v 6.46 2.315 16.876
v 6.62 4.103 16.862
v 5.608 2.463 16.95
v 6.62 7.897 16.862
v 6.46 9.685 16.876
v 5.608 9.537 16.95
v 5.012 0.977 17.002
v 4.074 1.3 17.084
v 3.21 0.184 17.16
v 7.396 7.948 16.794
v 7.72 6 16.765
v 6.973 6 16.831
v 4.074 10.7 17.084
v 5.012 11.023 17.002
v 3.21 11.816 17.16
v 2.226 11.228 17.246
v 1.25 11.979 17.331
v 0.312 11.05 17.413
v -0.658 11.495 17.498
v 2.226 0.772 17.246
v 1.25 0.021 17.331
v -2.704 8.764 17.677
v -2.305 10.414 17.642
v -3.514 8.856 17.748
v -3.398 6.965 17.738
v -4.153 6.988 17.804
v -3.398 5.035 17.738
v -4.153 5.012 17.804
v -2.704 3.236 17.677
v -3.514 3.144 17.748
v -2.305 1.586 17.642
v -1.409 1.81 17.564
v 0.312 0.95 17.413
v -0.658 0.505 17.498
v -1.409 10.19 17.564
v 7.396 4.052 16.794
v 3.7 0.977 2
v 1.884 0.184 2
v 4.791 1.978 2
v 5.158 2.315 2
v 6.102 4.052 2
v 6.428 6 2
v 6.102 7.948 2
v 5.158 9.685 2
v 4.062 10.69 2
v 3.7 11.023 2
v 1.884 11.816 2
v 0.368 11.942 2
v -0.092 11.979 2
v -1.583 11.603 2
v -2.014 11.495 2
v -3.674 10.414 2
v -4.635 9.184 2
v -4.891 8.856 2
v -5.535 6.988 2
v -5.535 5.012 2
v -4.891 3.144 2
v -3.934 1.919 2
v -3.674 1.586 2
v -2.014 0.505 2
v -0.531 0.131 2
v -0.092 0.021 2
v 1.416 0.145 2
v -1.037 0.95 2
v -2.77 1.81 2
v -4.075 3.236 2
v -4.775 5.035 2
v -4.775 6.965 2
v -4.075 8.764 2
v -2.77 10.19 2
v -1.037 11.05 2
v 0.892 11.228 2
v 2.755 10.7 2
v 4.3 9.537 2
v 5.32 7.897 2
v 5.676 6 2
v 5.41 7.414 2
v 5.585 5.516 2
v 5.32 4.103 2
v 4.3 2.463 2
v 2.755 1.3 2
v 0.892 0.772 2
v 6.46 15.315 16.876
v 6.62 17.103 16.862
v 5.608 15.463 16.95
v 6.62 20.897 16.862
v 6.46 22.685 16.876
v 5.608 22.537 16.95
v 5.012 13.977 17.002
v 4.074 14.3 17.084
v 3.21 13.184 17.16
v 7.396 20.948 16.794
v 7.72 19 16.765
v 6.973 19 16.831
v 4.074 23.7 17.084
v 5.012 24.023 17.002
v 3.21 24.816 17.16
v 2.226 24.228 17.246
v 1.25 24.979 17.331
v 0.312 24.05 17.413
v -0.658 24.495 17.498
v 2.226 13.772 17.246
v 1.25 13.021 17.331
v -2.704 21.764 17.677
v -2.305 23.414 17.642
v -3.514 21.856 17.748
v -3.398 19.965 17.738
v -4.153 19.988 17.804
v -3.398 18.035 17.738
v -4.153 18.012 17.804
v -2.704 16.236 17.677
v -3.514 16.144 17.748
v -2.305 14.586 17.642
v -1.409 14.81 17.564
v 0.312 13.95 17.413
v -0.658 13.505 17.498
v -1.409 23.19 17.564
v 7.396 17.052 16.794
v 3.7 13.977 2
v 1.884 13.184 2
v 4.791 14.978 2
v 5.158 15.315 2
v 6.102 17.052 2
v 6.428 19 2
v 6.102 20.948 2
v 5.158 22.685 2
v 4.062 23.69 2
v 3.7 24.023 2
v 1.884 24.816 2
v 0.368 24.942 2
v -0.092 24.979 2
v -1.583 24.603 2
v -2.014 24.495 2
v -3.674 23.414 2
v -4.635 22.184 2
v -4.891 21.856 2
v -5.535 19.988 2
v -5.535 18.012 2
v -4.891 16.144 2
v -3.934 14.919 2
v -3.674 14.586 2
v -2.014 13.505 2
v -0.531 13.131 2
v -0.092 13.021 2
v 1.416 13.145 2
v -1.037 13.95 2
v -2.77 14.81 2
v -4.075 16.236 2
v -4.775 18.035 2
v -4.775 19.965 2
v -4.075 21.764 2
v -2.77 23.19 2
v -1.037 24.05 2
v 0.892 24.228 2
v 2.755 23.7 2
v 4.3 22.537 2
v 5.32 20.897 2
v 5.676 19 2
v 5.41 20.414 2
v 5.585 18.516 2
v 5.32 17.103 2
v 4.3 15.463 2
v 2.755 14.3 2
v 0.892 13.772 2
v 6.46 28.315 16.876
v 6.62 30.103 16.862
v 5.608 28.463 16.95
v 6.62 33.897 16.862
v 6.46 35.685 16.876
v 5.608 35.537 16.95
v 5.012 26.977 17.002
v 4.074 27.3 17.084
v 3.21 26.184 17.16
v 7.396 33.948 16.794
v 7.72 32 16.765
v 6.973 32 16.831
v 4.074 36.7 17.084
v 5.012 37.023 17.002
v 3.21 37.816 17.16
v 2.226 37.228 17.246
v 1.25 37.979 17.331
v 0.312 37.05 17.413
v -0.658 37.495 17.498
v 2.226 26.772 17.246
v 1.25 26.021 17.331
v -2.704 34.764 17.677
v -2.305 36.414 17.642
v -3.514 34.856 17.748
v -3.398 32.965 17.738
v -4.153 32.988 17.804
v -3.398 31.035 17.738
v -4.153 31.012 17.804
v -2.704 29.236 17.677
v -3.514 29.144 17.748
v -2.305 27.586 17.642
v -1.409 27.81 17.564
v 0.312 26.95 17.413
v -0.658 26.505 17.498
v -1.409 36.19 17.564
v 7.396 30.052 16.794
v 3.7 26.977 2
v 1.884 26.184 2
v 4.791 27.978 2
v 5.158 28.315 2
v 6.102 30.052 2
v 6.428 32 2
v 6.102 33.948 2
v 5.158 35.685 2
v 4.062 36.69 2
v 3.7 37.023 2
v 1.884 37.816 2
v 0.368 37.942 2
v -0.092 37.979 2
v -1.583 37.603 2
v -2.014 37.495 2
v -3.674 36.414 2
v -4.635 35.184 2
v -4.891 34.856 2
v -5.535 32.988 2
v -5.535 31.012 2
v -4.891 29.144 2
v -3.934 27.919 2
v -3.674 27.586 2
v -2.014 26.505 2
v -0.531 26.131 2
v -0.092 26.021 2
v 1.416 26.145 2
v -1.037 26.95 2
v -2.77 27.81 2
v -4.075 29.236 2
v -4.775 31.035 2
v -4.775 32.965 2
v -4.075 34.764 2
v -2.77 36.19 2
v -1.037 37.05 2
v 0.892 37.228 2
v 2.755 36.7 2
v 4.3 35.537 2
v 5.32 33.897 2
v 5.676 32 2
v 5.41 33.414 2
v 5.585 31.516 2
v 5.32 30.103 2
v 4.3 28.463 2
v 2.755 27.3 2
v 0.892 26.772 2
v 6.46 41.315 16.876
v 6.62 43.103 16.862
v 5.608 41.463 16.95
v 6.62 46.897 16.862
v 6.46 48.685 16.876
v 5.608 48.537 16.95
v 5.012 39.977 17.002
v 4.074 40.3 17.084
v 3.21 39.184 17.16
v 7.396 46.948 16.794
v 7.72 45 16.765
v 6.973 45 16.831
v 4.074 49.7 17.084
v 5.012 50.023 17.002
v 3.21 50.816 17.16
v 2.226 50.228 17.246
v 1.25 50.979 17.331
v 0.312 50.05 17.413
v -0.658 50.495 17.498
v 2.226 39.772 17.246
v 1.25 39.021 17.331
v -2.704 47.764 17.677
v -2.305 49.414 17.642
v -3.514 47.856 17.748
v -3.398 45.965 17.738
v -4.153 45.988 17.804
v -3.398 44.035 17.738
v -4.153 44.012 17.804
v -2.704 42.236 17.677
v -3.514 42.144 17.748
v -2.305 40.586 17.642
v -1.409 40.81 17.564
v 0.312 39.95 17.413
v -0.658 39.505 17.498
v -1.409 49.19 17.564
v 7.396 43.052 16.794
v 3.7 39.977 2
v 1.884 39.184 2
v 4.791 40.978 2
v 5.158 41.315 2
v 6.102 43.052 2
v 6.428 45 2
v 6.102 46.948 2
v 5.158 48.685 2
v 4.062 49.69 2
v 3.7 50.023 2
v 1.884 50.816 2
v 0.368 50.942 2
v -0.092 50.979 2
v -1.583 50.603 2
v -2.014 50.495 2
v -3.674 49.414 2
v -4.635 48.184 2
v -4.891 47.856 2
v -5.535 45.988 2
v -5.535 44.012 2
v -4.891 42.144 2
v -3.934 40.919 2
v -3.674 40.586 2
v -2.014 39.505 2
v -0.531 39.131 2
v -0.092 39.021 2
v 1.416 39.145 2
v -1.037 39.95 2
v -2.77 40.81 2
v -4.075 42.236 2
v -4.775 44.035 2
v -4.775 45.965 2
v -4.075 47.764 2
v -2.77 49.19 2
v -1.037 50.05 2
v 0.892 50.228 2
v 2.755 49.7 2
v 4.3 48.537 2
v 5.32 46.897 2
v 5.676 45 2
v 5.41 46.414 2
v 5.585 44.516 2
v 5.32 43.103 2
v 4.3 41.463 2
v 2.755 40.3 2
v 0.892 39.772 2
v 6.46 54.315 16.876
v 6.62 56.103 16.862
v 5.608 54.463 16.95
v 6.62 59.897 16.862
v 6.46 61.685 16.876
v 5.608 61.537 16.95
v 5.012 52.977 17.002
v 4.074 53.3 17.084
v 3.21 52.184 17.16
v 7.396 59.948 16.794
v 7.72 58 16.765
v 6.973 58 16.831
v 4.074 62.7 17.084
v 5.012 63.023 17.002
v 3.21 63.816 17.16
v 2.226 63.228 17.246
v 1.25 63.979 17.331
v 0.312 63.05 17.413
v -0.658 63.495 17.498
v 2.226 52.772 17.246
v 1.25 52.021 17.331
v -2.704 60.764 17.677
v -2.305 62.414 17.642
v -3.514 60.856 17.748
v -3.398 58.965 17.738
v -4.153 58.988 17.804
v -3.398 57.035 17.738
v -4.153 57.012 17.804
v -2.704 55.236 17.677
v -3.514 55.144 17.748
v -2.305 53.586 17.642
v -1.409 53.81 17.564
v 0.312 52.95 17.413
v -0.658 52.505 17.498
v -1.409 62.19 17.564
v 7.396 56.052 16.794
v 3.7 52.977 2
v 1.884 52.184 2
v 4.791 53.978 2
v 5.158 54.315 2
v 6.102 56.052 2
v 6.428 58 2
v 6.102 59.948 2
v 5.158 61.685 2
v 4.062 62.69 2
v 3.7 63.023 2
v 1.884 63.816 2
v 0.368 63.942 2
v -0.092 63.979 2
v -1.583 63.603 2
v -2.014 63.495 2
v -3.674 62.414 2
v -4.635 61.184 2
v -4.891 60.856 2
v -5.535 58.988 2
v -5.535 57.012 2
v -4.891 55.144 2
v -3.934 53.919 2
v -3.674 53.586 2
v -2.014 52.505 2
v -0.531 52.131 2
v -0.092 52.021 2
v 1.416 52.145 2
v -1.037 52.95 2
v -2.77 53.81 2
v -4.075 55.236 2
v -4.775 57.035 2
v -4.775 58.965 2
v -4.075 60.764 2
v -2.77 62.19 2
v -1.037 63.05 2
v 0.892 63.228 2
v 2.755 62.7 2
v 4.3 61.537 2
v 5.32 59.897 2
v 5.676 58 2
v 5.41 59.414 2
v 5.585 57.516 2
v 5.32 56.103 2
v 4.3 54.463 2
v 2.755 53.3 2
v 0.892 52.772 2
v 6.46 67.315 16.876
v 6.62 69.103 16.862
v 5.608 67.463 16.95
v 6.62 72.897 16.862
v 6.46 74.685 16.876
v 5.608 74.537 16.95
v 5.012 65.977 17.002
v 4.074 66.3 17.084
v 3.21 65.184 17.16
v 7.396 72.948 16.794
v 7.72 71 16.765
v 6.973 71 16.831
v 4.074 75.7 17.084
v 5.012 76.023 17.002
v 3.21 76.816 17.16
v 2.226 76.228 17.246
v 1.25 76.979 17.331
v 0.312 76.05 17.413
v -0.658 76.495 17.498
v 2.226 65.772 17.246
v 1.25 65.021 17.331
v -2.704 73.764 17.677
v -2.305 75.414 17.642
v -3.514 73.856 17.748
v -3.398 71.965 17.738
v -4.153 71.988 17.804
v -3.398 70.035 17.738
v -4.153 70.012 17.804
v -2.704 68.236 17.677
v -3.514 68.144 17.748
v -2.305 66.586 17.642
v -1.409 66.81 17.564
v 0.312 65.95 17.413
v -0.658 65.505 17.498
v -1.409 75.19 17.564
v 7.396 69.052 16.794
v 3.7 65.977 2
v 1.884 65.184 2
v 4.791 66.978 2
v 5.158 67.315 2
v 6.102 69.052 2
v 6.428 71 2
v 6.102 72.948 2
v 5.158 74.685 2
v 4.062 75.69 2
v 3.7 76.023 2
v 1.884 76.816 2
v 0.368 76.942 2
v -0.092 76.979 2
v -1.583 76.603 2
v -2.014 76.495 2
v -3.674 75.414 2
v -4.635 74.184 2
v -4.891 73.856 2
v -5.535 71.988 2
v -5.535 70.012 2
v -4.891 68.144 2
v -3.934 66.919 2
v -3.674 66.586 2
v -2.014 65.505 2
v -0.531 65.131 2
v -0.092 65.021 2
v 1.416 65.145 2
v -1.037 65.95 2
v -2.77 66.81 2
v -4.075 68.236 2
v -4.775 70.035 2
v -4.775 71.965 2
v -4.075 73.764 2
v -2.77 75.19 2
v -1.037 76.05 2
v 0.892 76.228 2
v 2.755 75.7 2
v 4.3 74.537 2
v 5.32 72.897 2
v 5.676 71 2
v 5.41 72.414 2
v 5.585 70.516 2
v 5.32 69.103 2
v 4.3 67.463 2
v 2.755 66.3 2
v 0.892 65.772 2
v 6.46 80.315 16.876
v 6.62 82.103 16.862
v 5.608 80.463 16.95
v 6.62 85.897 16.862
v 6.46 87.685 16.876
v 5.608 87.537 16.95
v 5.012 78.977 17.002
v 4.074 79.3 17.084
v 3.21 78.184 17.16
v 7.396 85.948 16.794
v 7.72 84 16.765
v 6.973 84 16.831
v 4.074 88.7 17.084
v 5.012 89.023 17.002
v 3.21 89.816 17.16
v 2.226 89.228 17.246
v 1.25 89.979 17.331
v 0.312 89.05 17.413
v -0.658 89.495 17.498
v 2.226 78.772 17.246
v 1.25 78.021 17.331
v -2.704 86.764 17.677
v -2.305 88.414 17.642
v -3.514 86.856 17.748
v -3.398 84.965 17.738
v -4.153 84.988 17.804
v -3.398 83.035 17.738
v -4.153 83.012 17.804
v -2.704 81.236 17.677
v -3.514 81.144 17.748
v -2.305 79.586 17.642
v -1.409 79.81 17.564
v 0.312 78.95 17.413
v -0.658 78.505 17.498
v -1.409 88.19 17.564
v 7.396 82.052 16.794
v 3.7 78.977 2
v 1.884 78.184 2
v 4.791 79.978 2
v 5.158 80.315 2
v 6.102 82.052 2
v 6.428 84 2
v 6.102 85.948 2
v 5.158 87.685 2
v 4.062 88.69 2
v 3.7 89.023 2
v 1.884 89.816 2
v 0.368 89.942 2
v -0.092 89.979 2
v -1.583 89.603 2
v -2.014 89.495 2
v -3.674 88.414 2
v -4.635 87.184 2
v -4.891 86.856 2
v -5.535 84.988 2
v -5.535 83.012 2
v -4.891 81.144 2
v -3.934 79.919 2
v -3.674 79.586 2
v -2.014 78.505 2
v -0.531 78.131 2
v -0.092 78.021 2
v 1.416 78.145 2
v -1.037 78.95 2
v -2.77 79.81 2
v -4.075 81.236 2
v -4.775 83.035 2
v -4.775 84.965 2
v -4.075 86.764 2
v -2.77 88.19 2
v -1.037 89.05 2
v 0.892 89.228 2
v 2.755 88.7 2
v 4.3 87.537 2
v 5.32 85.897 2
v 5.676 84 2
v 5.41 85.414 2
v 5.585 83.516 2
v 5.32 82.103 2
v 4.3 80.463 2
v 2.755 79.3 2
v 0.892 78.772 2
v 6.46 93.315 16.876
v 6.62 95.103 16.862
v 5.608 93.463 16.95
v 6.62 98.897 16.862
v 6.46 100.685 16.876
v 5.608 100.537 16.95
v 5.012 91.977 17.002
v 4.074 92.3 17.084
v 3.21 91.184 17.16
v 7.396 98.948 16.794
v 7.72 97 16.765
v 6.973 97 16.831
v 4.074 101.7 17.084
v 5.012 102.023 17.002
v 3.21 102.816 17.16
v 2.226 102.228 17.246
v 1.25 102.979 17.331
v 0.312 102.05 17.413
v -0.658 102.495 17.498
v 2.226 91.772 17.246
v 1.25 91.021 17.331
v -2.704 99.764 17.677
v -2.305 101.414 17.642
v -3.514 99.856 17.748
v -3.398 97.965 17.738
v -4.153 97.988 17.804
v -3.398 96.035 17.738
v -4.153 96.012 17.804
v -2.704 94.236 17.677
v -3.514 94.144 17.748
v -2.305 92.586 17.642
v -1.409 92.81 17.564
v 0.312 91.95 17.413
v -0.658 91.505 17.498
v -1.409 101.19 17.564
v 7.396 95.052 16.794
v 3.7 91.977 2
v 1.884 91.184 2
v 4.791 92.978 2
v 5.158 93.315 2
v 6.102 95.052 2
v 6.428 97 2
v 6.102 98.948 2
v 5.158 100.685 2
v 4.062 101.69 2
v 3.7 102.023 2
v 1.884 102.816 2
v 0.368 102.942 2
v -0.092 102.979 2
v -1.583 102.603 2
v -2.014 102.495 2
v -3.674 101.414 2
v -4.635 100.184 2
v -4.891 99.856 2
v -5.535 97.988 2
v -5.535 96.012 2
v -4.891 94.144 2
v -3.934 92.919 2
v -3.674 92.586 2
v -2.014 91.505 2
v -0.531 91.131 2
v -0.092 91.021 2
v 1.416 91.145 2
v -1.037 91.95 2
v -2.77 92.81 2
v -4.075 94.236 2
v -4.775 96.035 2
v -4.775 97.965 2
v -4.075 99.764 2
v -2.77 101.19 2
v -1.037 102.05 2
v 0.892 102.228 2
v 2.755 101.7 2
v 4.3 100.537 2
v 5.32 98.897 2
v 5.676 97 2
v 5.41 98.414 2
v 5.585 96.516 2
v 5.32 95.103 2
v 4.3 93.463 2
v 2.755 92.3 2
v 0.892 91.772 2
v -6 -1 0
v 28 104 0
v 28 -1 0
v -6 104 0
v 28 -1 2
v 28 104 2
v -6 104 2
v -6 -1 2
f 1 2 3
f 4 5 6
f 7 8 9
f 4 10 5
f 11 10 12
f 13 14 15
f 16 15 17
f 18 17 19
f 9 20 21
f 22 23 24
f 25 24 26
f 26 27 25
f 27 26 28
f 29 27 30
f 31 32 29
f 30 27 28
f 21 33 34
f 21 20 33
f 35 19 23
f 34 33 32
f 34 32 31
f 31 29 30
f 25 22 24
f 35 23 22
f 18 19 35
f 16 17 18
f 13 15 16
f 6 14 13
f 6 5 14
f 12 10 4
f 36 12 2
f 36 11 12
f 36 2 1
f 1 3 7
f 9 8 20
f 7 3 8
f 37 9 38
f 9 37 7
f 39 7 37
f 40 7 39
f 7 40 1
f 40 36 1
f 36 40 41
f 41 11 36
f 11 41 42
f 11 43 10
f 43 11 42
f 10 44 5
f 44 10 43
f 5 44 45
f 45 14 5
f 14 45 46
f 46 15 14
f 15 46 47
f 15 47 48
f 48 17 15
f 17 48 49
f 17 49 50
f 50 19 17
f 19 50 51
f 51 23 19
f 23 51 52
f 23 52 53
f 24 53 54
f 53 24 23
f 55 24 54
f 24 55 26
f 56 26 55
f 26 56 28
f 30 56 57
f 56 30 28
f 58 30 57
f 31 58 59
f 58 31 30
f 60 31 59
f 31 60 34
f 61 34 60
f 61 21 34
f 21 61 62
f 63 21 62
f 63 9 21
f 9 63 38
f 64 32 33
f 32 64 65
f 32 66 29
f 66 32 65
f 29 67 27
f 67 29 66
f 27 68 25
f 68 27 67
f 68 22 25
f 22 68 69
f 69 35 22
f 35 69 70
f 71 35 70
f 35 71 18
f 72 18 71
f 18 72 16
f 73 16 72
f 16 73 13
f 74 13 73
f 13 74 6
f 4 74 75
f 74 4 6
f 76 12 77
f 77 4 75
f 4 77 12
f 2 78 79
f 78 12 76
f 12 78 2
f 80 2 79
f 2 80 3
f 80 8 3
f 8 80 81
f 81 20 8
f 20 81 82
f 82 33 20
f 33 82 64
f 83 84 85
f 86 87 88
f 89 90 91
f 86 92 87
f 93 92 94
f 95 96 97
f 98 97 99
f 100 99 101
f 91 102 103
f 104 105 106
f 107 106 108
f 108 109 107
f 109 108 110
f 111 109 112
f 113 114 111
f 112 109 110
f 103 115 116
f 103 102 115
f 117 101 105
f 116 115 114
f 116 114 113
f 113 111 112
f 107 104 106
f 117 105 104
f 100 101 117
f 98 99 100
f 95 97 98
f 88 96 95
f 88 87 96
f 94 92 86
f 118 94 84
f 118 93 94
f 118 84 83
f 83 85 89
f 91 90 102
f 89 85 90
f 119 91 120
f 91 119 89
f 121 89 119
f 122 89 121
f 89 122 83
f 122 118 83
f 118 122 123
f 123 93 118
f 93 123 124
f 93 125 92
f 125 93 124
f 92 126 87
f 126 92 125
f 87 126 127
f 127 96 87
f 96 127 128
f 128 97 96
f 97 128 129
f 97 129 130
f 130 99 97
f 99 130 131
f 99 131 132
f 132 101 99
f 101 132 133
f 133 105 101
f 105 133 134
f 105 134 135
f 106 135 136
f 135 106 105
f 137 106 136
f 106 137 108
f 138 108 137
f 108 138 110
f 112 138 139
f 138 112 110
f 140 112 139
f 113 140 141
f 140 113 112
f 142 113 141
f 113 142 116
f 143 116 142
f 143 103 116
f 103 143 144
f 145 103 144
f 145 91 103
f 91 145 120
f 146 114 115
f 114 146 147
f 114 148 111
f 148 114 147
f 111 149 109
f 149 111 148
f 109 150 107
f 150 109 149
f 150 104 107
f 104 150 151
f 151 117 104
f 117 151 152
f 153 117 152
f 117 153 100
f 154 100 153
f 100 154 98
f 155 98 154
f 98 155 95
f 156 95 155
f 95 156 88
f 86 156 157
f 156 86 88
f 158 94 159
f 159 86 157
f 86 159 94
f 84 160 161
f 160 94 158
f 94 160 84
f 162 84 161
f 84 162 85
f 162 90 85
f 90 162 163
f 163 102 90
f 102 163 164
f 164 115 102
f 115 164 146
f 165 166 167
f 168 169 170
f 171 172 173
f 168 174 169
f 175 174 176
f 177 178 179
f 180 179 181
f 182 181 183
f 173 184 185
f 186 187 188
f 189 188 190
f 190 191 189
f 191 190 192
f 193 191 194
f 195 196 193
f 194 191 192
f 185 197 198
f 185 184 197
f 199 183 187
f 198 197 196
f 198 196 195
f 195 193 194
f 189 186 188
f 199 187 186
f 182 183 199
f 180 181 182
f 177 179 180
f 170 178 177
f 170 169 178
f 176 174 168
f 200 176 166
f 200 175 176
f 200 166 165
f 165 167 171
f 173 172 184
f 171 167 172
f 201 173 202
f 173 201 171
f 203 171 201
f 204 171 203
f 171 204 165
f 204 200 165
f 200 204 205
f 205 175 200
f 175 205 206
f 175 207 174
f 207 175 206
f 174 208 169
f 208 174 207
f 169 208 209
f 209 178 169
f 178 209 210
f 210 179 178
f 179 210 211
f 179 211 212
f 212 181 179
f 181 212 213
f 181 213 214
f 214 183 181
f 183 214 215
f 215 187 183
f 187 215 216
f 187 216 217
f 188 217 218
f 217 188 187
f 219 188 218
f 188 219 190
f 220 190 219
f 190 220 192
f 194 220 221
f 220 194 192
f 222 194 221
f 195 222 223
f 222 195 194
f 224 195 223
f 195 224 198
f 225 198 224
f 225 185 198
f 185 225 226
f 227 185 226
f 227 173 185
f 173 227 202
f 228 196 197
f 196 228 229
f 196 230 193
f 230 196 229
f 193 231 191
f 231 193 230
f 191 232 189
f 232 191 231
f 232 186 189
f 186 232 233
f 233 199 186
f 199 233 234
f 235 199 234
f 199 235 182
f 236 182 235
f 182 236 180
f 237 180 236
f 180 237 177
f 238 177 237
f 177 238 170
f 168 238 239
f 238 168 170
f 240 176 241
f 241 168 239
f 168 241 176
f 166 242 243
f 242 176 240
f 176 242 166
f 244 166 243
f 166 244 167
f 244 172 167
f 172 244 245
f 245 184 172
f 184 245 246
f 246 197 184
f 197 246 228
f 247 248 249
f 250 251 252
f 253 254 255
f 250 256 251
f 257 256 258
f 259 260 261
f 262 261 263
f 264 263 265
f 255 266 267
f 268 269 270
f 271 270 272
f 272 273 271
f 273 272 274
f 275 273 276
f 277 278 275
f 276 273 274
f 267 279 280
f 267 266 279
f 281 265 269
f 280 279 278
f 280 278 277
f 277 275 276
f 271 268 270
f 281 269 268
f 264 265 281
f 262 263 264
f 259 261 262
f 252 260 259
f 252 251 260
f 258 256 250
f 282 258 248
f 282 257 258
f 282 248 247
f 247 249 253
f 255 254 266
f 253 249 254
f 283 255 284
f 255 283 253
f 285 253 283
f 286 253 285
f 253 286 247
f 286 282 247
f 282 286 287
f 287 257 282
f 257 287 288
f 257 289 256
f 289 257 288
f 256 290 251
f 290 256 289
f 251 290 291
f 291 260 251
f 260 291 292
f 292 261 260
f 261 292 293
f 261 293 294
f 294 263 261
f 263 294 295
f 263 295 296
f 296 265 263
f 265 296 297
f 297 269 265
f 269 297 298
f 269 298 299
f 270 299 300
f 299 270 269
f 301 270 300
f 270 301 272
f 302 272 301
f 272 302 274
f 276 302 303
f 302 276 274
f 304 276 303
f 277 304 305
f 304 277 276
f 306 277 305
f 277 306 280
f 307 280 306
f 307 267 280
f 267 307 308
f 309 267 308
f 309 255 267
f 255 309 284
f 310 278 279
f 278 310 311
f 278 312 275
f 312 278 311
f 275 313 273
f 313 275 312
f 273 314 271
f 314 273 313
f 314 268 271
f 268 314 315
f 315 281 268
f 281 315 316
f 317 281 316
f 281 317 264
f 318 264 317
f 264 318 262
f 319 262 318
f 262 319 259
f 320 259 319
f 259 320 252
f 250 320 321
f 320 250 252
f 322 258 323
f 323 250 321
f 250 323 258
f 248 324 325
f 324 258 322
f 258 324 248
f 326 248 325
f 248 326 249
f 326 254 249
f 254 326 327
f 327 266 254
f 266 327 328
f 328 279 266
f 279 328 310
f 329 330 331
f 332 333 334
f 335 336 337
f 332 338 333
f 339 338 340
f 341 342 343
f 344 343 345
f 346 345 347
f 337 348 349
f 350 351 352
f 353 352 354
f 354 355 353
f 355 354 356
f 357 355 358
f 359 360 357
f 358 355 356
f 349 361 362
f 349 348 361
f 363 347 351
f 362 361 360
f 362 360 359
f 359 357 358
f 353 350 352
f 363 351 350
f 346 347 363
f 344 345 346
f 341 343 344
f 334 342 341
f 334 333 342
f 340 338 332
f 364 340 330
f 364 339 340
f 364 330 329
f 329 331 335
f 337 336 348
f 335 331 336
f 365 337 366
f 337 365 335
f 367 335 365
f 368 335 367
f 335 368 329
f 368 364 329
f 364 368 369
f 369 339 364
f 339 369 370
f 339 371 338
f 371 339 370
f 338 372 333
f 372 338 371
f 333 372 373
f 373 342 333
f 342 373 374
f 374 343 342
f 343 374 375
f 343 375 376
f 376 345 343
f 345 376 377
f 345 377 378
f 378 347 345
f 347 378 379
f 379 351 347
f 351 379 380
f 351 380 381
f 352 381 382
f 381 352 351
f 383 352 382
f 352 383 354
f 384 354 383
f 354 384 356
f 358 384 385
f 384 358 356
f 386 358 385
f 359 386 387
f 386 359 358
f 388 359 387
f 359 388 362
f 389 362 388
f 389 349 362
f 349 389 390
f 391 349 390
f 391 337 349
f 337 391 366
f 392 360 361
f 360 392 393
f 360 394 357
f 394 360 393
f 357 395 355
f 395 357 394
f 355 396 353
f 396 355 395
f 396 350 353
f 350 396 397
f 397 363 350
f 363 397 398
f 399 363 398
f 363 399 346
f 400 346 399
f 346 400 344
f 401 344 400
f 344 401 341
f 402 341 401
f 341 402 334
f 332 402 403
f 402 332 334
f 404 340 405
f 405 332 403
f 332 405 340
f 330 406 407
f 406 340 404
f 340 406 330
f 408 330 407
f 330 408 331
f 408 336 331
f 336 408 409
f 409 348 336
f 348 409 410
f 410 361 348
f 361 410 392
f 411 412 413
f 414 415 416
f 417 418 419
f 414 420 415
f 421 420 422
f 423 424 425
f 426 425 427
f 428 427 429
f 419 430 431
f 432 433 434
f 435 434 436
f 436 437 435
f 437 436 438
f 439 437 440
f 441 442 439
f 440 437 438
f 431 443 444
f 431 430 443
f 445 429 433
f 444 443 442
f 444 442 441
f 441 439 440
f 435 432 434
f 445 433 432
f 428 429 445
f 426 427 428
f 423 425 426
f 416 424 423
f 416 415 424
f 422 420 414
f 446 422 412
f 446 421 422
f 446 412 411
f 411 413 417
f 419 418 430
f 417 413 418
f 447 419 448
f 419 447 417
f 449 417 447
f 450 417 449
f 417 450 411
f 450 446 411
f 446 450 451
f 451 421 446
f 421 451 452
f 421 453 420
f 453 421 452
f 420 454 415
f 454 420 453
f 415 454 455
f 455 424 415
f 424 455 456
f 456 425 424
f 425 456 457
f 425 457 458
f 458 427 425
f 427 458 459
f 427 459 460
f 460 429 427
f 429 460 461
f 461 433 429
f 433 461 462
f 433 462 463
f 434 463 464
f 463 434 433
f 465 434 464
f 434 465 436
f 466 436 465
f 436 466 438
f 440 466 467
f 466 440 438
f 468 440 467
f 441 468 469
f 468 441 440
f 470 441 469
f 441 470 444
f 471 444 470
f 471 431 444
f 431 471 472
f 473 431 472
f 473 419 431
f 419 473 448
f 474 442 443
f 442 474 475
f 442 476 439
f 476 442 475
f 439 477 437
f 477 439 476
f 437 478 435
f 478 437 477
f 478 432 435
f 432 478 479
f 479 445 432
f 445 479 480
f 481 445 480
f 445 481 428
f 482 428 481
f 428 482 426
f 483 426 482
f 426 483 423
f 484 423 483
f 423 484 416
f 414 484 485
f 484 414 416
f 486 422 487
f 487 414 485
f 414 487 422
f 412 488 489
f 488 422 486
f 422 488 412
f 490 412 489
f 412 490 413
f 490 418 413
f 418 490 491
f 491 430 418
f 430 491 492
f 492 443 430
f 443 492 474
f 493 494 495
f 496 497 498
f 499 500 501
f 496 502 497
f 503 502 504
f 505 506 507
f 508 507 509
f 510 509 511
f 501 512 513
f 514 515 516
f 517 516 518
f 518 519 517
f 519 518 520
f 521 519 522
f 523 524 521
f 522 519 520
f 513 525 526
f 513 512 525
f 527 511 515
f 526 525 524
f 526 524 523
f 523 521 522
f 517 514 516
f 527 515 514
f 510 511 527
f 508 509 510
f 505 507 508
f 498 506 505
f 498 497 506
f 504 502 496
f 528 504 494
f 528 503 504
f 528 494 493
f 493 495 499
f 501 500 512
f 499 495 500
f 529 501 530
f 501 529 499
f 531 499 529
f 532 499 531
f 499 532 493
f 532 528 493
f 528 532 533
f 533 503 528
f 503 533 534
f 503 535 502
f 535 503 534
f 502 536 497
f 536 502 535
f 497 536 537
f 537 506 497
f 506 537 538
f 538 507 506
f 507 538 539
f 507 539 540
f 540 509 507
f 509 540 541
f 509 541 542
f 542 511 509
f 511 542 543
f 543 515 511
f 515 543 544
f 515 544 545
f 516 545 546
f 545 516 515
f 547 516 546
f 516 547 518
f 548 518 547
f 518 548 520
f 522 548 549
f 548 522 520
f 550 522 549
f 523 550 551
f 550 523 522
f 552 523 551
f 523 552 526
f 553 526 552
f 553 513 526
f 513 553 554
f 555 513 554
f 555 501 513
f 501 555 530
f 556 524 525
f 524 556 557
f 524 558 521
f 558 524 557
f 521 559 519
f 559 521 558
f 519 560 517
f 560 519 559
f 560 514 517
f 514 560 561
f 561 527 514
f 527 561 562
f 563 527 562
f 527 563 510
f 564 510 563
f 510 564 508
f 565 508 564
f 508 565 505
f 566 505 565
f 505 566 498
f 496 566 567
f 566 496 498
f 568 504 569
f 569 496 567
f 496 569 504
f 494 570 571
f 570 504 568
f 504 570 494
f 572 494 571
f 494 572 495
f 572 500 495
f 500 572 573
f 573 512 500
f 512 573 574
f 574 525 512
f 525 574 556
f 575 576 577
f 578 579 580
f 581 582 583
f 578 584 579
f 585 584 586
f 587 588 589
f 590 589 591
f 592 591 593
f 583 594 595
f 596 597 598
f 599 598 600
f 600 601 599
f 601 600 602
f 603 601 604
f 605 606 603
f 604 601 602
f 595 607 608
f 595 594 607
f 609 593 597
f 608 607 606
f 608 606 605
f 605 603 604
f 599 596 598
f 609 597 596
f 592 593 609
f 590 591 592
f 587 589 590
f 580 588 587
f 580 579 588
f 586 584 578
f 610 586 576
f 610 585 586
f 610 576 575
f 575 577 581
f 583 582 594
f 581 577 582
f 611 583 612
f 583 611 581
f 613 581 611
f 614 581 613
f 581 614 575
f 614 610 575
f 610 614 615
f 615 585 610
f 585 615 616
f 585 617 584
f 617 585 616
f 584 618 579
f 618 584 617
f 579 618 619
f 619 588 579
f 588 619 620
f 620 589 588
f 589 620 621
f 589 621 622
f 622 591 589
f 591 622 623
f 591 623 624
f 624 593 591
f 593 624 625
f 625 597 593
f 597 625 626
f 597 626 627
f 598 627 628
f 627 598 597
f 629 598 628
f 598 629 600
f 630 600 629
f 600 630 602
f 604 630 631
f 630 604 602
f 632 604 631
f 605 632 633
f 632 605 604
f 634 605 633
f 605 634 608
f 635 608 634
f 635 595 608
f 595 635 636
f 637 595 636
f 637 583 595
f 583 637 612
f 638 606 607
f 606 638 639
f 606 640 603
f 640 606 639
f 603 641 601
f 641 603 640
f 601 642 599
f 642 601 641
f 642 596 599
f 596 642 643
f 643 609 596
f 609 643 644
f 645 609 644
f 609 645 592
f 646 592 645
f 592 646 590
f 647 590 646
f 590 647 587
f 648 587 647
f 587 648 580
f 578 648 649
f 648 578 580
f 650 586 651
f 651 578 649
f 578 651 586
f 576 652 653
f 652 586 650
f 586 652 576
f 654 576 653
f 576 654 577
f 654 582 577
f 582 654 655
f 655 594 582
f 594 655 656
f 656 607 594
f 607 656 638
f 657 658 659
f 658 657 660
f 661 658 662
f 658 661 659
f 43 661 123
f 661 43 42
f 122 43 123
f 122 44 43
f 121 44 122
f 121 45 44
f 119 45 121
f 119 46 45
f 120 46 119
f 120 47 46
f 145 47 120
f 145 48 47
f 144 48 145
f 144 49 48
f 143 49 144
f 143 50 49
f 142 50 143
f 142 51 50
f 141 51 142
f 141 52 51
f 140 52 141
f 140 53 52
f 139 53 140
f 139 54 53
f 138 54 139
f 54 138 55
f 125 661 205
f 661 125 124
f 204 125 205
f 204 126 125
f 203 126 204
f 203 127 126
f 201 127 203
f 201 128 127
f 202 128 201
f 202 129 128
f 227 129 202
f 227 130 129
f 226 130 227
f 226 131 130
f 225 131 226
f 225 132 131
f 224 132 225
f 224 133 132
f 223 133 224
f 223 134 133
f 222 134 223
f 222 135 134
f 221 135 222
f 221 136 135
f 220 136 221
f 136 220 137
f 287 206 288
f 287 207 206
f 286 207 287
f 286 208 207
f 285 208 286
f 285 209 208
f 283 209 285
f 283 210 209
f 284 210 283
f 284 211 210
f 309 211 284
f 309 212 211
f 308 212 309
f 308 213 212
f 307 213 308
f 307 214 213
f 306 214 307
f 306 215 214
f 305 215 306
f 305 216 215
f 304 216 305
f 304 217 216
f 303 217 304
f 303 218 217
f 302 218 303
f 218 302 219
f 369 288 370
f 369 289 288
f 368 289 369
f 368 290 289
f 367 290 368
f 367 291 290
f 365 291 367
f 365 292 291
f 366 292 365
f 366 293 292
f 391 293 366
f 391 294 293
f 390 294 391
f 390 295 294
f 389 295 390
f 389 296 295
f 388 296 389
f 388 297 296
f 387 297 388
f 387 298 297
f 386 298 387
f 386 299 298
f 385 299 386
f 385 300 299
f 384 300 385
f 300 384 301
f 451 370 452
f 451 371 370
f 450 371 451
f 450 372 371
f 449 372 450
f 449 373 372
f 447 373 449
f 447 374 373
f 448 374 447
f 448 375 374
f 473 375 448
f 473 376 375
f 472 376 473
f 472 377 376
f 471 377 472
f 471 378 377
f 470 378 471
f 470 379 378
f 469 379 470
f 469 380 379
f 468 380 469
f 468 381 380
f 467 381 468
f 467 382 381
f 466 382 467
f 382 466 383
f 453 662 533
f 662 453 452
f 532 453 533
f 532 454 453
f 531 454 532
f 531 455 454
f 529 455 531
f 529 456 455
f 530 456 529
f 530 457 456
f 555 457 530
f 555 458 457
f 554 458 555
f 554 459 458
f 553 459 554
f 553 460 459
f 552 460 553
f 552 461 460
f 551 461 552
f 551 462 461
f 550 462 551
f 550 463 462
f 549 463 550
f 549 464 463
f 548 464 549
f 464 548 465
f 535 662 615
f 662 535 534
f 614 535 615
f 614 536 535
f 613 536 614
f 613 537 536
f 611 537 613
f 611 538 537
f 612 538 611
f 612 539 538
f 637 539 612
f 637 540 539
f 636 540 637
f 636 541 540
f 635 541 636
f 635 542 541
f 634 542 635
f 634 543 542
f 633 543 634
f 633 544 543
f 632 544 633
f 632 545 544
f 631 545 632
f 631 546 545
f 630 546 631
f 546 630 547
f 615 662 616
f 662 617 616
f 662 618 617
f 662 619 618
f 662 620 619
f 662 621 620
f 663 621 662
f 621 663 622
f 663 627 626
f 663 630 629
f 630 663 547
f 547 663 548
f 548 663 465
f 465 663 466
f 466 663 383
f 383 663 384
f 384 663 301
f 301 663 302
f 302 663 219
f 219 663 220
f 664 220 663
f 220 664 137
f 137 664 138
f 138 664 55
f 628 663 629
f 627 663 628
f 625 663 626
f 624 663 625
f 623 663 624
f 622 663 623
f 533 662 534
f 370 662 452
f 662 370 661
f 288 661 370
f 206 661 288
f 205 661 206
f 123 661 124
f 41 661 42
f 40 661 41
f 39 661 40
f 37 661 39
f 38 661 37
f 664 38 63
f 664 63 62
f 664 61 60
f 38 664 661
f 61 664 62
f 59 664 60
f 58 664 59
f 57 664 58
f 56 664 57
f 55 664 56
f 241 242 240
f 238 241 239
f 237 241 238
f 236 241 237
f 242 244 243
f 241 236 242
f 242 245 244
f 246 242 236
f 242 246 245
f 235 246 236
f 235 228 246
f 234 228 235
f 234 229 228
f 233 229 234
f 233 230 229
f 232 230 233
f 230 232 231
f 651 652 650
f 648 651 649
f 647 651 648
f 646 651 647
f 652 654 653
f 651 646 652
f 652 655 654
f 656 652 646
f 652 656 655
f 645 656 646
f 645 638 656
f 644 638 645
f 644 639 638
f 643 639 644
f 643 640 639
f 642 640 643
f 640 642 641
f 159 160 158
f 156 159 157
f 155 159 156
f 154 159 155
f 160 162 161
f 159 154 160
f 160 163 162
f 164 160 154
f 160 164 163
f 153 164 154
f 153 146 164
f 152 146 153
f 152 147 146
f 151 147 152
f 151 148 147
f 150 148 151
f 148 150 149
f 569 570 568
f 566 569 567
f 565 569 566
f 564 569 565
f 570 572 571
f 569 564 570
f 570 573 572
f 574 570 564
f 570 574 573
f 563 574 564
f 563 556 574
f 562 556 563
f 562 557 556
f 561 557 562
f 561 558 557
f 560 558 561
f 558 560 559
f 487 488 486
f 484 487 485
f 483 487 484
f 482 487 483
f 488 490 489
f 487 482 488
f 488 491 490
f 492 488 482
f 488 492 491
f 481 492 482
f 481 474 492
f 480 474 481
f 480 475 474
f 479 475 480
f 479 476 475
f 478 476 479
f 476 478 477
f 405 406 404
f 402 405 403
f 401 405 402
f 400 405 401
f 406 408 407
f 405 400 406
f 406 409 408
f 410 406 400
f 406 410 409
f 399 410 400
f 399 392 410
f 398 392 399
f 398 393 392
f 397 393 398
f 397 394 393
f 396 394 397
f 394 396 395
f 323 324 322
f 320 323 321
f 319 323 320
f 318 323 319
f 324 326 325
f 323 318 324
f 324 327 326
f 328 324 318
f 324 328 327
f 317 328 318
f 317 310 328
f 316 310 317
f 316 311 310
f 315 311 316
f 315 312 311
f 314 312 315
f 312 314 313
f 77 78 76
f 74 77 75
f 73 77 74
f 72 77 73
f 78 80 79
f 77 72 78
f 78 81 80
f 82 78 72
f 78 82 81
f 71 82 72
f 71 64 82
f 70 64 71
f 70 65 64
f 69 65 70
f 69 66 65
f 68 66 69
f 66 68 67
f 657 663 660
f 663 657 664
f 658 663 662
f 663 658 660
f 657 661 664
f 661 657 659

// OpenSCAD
/*
    
 ______                                                
/\  _  \                                               
\ \ \L\ \                                              
 \ \  __ \                                             
  \ \ \/\ \                                            
   \ \_\ \_\                                           
    \/_/\/_/                                           
                                                       
                                                       
 ____        __                   __                   
/\  _`\   __/\ \__               /\ \                  
\ \ \L\ \/\_\ \ ,_\    __    ____\ \ \___              
 \ \ ,  /\/\ \ \ \/  /'__`\ /',__\\ \  _ `\            
  \ \ \\ \\ \ \ \ \_/\  __//\__, `\\ \ \ \ \           
   \ \_\ \_\ \_\ \__\ \____\/\____/ \ \_\ \_\          
    \/_/\/ /\/_/\/__/\/____/\/___/   \/_/\/_/          
                                                       
                                                       
 __  __   __                                           
/\ \/\ \ /\ \                                          
\ \ \/'/'\ \ \___      __      ___     ___      __     
 \ \ , <  \ \  _ `\  /'__`\  /' _ `\ /' _ `\  /'__`\   
  \ \ \\`\ \ \ \ \ \/\ \L\.\_/\ \/\ \/\ \/\ \/\ \L\.\_ 
   \ \_\ \_\\ \_\ \_\ \__/.\_\ \_\ \_\ \_\ \_\ \__/.\_\
    \/_/\/_/ \/_/\/_/\/__/\/_/\/_/\/_/\/_/\/_/\/__/\/_/
                                                       
                                                       
 ____                                                  
/\  _`\                  __                            
\ \ \/\ \     __    ____/\_\     __     ___            
 \ \ \ \ \  /'__`\ /',__\/\ \  /'_ `\ /' _ `\          
  \ \ \_\ \/\  __//\__, `\ \ \/\ \L\ \/\ \/\ \         
   \ \____/\ \____\/\____/\ \_\ \____ \ \_\ \_\        
    \/___/  \/____/\/___/  \/_/\/___L\ \/_/\/_/        
                                 /\____/               
                                 \_/__/                

Ritesh Khanna - ritesh@gmail.com

Please enjoy, revise and share this sharpie marker holder freely.
I always appriciate it when credit is given back to me!

*/

holeCount = 8;          //Number of sharpies to hold.
holeDiameter=12;        //Diameter INCLUDING wall thickness of each hole.
holeWallThickness = 1.5;//Wall Thickness of the holes
holeHeight = 20;        //Height of each hole
holeGap = 1;            //Distance between each hole
angle=5;                //Angle of each hole
baseHeight = 2;         //Thickness of base.


//Logic, no need to edit below this line.
difference()
{
    holes();
    translate([0,0,-holeHeight])
    {
        base(holeHeight,18);
    }
}
translate([2,0,0])


base(baseHeight,18);

module base(height, addedDepth)
{
    length = (holeDiameter + holeGap) * holeCount + holeGap;
translate([ -( holeDiameter / 2 + holeGap * 2) ,-holeGap,0])
{
    cube( [holeDiameter + holeGap * 4 + addedDepth,length,height]);
};

}

module holes()
{
    for (i = [0:holeCount-1])
    {
        translate([0,i * (holeDiameter + holeGap) + holeDiameter *0.5, -(sin(25) * (holeDiameter/2) ) -0.1 ])
        {
            rotate([0,angle,0])
            {
                linear_extrude(holeHeight)
                {
                    difference()
                    {
                        circle(d=holeDiameter);
                        circle(d=(holeDiameter-holeWallThickness));
                    }
                }
            }
        }
    }
}
